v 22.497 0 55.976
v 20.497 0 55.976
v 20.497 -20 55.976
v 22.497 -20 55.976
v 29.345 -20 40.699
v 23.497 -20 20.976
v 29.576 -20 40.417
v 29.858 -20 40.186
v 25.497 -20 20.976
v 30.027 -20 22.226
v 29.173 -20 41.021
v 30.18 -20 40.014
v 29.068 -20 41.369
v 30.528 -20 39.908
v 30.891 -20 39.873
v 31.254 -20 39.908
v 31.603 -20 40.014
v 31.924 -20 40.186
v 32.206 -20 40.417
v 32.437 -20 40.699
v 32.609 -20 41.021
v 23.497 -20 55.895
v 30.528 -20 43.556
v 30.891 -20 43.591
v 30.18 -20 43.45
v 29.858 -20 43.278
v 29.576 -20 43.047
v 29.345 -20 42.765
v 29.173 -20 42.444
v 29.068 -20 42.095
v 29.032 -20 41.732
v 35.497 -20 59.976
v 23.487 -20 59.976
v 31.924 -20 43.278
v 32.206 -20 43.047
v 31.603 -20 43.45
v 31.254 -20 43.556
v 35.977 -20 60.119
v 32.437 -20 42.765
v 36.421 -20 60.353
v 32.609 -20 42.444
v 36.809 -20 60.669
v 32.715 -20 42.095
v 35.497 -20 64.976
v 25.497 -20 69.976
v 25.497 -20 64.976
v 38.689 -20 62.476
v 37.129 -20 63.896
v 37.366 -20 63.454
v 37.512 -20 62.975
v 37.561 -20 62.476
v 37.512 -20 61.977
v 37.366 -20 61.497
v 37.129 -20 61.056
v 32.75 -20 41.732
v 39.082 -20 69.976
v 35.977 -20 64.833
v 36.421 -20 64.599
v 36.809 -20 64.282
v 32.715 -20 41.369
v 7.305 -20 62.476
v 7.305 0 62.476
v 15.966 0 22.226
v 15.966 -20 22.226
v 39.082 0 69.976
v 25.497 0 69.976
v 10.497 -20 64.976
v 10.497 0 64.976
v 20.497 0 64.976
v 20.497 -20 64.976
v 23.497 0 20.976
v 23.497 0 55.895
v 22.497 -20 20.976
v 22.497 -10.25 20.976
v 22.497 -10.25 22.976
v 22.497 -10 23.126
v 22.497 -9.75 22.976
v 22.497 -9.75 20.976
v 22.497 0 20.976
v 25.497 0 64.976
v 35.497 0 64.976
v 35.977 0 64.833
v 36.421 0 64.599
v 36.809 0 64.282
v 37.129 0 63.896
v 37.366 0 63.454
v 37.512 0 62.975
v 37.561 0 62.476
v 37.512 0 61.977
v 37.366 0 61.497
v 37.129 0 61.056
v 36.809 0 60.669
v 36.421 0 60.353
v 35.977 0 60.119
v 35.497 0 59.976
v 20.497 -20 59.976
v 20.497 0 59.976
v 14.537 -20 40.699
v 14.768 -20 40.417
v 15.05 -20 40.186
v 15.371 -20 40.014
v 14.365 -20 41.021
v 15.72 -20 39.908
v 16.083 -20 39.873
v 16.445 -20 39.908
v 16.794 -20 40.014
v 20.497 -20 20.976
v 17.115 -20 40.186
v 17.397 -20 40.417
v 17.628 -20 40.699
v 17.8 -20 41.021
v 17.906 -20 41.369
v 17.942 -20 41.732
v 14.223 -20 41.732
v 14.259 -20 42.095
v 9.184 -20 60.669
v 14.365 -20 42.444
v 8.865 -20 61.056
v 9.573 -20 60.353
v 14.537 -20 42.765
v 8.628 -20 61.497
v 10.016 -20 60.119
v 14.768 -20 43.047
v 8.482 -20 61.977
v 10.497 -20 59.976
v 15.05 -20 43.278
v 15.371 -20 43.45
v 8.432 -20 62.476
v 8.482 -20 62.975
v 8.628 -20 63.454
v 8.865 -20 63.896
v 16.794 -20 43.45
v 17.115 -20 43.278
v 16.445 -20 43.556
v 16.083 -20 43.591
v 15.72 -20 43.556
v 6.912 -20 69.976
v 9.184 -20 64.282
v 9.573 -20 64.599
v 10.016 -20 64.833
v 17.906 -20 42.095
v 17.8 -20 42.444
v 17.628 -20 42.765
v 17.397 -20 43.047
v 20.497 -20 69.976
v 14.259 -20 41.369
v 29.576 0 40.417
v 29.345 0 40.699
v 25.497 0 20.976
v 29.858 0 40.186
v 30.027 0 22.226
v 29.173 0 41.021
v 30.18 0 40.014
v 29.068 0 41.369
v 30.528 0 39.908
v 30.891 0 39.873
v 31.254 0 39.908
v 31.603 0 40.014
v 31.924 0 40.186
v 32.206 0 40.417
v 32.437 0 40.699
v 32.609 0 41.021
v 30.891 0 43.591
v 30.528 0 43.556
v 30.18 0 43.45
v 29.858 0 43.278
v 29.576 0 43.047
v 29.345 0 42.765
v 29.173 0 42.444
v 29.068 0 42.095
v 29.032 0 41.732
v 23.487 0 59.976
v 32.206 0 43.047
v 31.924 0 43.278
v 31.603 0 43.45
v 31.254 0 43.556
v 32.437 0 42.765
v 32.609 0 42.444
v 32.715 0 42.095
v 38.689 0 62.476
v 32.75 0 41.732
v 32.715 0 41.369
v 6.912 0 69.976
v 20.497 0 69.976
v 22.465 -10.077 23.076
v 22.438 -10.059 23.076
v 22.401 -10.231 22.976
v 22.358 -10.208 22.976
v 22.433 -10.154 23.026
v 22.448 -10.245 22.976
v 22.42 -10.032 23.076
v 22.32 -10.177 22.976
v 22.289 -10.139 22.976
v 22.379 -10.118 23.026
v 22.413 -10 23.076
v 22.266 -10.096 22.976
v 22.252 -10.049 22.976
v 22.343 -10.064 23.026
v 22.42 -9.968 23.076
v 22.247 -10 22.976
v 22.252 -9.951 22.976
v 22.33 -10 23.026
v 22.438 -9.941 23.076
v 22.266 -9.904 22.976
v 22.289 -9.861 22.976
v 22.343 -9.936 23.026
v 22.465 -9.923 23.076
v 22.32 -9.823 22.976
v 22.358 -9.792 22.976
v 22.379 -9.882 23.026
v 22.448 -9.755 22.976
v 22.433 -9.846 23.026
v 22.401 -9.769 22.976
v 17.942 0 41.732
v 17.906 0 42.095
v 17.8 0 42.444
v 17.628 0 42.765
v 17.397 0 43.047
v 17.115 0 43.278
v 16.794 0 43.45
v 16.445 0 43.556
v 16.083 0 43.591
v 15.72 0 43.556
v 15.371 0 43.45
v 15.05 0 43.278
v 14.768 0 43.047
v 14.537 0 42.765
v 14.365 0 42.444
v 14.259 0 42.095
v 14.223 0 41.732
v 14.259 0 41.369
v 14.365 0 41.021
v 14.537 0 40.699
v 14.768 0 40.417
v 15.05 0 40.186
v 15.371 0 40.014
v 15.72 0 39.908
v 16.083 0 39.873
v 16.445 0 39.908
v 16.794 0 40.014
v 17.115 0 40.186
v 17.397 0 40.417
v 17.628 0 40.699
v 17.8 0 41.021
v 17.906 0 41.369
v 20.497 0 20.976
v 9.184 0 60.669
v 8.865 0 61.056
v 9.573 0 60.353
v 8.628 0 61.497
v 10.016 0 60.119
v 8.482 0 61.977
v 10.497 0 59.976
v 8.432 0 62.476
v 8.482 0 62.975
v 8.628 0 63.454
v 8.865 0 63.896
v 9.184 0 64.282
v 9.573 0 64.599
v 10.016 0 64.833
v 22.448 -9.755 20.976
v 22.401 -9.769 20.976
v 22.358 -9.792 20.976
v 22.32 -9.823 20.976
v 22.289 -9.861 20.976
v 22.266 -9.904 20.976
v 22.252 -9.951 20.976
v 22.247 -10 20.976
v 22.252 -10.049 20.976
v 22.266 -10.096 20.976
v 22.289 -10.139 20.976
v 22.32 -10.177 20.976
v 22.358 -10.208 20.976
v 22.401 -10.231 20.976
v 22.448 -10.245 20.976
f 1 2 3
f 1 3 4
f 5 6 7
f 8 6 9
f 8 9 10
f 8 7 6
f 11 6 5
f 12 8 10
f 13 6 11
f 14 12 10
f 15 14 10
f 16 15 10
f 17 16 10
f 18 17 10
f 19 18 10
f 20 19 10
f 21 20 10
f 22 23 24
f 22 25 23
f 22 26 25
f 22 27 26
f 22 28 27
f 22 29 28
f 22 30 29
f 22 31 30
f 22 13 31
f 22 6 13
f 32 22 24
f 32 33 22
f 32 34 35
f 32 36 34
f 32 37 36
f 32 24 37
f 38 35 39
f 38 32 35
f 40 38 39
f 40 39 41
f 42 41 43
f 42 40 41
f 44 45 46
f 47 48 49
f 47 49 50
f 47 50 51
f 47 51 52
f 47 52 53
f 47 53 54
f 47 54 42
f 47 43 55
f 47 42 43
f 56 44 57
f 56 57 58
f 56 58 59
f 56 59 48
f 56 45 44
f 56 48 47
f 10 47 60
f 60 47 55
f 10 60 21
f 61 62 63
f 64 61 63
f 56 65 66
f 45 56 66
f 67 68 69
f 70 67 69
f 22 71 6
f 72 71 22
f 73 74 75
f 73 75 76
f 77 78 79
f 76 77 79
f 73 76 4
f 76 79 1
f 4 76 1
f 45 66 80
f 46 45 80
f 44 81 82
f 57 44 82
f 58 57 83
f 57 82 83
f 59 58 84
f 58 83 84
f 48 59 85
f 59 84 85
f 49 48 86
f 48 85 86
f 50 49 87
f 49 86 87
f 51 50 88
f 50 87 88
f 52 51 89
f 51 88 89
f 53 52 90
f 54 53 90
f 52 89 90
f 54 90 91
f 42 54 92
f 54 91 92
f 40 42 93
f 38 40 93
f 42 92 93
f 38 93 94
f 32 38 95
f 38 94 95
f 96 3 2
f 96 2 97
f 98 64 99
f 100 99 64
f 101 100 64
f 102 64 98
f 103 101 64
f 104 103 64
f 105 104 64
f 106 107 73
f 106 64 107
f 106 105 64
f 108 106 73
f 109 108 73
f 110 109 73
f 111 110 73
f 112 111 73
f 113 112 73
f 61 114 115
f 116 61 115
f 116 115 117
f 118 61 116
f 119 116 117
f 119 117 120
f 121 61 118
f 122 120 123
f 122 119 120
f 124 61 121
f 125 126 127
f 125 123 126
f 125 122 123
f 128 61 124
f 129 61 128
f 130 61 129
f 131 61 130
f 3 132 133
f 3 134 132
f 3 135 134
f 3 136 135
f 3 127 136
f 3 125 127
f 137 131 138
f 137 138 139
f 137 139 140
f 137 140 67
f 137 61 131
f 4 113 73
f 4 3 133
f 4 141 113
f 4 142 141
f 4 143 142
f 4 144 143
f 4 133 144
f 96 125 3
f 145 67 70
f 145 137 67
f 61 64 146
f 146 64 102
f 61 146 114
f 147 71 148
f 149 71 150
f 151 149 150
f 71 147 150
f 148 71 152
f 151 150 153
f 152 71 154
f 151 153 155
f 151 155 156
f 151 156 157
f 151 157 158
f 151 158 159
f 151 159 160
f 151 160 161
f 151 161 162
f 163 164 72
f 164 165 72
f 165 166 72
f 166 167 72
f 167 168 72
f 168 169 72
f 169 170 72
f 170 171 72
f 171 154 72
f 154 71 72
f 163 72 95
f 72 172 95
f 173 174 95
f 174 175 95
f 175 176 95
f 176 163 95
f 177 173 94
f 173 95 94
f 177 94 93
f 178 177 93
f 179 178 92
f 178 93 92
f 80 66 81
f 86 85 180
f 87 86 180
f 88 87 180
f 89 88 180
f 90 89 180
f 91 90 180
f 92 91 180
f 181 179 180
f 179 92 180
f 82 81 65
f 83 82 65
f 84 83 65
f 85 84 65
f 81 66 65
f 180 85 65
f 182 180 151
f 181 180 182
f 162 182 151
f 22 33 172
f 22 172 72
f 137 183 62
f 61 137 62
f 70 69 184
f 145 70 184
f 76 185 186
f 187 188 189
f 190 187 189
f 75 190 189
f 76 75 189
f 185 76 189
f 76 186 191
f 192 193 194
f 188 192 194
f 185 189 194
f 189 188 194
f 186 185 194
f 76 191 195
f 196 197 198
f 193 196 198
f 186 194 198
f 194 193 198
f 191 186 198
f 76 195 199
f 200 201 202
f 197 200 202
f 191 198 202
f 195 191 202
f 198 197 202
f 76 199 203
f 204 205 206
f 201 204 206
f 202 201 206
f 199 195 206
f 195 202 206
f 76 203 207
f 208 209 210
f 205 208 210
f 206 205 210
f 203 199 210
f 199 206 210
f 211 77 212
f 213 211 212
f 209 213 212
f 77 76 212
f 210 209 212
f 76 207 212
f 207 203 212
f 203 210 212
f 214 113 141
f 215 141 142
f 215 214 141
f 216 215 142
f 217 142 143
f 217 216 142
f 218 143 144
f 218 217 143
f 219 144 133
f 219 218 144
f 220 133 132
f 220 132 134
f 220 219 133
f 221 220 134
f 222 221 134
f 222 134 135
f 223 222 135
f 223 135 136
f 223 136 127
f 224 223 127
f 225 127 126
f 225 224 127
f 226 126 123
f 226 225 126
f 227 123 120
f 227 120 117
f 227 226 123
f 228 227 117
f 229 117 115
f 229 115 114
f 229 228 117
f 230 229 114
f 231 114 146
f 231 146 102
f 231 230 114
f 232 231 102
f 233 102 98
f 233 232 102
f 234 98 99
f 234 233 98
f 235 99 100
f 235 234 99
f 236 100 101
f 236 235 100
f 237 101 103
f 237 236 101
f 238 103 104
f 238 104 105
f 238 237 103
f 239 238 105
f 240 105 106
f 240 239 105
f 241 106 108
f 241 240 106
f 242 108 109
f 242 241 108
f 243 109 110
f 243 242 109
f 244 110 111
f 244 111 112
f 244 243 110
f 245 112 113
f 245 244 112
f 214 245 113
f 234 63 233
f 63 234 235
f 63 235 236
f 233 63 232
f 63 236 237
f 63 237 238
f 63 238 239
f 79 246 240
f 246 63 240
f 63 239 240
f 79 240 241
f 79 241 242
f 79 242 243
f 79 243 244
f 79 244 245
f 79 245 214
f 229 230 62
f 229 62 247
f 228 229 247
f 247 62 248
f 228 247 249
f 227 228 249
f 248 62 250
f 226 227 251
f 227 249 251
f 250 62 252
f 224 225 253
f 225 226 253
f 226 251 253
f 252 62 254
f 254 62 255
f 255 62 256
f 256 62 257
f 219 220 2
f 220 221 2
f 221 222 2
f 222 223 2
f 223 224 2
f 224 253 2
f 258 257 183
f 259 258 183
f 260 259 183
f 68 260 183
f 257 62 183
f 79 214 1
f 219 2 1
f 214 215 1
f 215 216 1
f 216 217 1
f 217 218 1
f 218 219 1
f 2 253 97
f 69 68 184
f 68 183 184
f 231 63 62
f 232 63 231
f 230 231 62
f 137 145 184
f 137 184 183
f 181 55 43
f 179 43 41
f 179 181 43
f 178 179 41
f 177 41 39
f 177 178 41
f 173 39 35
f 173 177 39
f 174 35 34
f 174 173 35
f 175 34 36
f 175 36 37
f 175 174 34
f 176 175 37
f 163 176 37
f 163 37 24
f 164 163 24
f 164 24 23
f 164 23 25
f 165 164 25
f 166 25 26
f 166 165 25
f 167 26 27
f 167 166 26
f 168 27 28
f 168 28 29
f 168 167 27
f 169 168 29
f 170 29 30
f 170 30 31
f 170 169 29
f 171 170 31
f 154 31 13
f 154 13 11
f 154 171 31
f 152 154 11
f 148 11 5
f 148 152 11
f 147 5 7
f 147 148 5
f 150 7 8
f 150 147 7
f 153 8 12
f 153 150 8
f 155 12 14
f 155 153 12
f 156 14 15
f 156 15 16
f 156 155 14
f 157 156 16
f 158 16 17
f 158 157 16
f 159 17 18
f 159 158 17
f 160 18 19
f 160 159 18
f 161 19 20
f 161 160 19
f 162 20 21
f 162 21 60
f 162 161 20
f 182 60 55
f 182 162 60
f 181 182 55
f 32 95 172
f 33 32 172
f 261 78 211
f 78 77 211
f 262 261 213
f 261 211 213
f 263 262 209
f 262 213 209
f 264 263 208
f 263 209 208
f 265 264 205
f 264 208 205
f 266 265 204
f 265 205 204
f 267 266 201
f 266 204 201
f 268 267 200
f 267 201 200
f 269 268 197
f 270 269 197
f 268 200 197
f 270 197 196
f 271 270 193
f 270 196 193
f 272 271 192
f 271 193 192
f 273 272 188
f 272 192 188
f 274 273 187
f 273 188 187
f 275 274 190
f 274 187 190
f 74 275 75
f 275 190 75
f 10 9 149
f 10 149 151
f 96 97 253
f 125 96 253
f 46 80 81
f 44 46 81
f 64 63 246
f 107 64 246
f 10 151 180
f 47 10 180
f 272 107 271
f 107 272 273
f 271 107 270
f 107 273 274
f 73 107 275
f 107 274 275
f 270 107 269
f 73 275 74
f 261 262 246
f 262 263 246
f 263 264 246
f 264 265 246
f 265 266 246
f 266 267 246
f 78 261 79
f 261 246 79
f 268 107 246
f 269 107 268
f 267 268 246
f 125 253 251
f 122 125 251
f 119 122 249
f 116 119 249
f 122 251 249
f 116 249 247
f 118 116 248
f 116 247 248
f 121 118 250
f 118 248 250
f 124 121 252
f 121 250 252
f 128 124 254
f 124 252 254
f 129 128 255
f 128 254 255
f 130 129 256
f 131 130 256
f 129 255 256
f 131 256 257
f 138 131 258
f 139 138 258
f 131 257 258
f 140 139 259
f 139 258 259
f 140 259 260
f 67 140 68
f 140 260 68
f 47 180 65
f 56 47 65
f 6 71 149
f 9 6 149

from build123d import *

# Parameters (mm, degrees)
F0_R     = 1.8592628509
F0_W     = 2
F0_H     = 34.9191774971
F1_DEPTH = 20
F0_H_2   = 35
F3_D     = 0.5
F3_DEPTH = 2
F3_TIP   = 0.1502151548


with BuildPart() as f1:
    # F0 (on Front) → F1 (new body)
    with BuildSketch(Plane.XZ):
        with BuildLine():
            Line((30.0273526112, 22.2264664745), (38.6886444998, 62.4758128023))
            Line((38.6886444998, 62.4758128023), (39.0815468509, 69.9758128023))
            Line((39.0815468509, 69.9758128023), (25.4968045878, 69.9758128023))
            Line((25.4968045878, 69.9758128023), (25.4968045878, 64.9758128023))
            Line((25.4968045878, 64.9758128023), (35.4968045878, 64.9758128023))
            ThreePointArc((35.4968045878, 64.9758128023), (37.5613964893, 62.4758128023), (35.4968045878, 59.9758128023))
            Line((35.4968045878, 59.9758128023), (25.4968045878, 59.9758128023))
            Line((25.4968045878, 59.9758128023), (25.4968045878, 55.8949902994))
            Line((25.4968045878, 55.8949902994), (25.4968045878, 20.9758128023))
            Line((25.4968045878, 20.9758128023), (30.0273526112, 22.2264664745))
        make_face()
        with Locations((30.8911041659, 41.7320145176)):
            Circle(F0_R, mode=Mode.SUBTRACT)
        with Locations((24.4968045878, 38.4354015509)):
            Rectangle(F0_W, F0_H)
        Polygon((23.4968045878, 55.8949902994), (25.4968045878, 55.8949902994), (25.4968045878, 59.9758128023), (23.4868045878, 59.9758128023), align=None)
    extrude(amount=F1_DEPTH)


with BuildPart() as f1b:
    # F0 (on Front) → F1, piece 2 (new body)
    with BuildSketch(Plane.XZ):
        with Locations((21.4968045878, 38.4758128023)):
            Rectangle(F0_W, F0_H_2)
        with BuildLine():
            Line((15.9662565644, 22.2264664745), (20.4968045878, 20.9758128023))
            Line((20.4968045878, 20.9758128023), (20.4968045878, 55.9758128023))
            Line((20.4968045878, 55.9758128023), (20.4968045878, 59.9758128023))
            Line((20.4968045878, 59.9758128023), (10.4968045878, 59.9758128023))
            ThreePointArc((10.4968045878, 59.9758128023), (8.4322126863, 62.4758128023), (10.4968045878, 64.9758128023))
            Line((10.4968045878, 64.9758128023), (20.4968045878, 64.9758128023))
            Line((20.4968045878, 64.9758128023), (20.4968045878, 69.9758128023))
            Line((20.4968045878, 69.9758128023), (6.9120623247, 69.9758128023))
            Line((6.9120623247, 69.9758128023), (7.3049646759, 62.4758128023))
            Line((7.3049646759, 62.4758128023), (15.9662565644, 22.2264664745))
        make_face()
        with Locations((16.0825050097, 41.7320145176)):
            Circle(F0_R, mode=Mode.SUBTRACT)
    extrude(amount=F1_DEPTH)

    # F3
    with Locations(Plane(origin=(0, 0, 20.9758128023), x_dir=(1, 0, 0), z_dir=(0, 0, -1))):
        with Locations((22.4968045878, 10)):
            Hole(F3_D / 2, depth=F3_DEPTH)
            with Locations((0, 0, -(F3_DEPTH + F3_TIP / 2))):  # 118° drill point
                Cone(0, F3_D / 2, F3_TIP, mode=Mode.SUBTRACT)


solid = Compound([f1.part, f1b.part])
